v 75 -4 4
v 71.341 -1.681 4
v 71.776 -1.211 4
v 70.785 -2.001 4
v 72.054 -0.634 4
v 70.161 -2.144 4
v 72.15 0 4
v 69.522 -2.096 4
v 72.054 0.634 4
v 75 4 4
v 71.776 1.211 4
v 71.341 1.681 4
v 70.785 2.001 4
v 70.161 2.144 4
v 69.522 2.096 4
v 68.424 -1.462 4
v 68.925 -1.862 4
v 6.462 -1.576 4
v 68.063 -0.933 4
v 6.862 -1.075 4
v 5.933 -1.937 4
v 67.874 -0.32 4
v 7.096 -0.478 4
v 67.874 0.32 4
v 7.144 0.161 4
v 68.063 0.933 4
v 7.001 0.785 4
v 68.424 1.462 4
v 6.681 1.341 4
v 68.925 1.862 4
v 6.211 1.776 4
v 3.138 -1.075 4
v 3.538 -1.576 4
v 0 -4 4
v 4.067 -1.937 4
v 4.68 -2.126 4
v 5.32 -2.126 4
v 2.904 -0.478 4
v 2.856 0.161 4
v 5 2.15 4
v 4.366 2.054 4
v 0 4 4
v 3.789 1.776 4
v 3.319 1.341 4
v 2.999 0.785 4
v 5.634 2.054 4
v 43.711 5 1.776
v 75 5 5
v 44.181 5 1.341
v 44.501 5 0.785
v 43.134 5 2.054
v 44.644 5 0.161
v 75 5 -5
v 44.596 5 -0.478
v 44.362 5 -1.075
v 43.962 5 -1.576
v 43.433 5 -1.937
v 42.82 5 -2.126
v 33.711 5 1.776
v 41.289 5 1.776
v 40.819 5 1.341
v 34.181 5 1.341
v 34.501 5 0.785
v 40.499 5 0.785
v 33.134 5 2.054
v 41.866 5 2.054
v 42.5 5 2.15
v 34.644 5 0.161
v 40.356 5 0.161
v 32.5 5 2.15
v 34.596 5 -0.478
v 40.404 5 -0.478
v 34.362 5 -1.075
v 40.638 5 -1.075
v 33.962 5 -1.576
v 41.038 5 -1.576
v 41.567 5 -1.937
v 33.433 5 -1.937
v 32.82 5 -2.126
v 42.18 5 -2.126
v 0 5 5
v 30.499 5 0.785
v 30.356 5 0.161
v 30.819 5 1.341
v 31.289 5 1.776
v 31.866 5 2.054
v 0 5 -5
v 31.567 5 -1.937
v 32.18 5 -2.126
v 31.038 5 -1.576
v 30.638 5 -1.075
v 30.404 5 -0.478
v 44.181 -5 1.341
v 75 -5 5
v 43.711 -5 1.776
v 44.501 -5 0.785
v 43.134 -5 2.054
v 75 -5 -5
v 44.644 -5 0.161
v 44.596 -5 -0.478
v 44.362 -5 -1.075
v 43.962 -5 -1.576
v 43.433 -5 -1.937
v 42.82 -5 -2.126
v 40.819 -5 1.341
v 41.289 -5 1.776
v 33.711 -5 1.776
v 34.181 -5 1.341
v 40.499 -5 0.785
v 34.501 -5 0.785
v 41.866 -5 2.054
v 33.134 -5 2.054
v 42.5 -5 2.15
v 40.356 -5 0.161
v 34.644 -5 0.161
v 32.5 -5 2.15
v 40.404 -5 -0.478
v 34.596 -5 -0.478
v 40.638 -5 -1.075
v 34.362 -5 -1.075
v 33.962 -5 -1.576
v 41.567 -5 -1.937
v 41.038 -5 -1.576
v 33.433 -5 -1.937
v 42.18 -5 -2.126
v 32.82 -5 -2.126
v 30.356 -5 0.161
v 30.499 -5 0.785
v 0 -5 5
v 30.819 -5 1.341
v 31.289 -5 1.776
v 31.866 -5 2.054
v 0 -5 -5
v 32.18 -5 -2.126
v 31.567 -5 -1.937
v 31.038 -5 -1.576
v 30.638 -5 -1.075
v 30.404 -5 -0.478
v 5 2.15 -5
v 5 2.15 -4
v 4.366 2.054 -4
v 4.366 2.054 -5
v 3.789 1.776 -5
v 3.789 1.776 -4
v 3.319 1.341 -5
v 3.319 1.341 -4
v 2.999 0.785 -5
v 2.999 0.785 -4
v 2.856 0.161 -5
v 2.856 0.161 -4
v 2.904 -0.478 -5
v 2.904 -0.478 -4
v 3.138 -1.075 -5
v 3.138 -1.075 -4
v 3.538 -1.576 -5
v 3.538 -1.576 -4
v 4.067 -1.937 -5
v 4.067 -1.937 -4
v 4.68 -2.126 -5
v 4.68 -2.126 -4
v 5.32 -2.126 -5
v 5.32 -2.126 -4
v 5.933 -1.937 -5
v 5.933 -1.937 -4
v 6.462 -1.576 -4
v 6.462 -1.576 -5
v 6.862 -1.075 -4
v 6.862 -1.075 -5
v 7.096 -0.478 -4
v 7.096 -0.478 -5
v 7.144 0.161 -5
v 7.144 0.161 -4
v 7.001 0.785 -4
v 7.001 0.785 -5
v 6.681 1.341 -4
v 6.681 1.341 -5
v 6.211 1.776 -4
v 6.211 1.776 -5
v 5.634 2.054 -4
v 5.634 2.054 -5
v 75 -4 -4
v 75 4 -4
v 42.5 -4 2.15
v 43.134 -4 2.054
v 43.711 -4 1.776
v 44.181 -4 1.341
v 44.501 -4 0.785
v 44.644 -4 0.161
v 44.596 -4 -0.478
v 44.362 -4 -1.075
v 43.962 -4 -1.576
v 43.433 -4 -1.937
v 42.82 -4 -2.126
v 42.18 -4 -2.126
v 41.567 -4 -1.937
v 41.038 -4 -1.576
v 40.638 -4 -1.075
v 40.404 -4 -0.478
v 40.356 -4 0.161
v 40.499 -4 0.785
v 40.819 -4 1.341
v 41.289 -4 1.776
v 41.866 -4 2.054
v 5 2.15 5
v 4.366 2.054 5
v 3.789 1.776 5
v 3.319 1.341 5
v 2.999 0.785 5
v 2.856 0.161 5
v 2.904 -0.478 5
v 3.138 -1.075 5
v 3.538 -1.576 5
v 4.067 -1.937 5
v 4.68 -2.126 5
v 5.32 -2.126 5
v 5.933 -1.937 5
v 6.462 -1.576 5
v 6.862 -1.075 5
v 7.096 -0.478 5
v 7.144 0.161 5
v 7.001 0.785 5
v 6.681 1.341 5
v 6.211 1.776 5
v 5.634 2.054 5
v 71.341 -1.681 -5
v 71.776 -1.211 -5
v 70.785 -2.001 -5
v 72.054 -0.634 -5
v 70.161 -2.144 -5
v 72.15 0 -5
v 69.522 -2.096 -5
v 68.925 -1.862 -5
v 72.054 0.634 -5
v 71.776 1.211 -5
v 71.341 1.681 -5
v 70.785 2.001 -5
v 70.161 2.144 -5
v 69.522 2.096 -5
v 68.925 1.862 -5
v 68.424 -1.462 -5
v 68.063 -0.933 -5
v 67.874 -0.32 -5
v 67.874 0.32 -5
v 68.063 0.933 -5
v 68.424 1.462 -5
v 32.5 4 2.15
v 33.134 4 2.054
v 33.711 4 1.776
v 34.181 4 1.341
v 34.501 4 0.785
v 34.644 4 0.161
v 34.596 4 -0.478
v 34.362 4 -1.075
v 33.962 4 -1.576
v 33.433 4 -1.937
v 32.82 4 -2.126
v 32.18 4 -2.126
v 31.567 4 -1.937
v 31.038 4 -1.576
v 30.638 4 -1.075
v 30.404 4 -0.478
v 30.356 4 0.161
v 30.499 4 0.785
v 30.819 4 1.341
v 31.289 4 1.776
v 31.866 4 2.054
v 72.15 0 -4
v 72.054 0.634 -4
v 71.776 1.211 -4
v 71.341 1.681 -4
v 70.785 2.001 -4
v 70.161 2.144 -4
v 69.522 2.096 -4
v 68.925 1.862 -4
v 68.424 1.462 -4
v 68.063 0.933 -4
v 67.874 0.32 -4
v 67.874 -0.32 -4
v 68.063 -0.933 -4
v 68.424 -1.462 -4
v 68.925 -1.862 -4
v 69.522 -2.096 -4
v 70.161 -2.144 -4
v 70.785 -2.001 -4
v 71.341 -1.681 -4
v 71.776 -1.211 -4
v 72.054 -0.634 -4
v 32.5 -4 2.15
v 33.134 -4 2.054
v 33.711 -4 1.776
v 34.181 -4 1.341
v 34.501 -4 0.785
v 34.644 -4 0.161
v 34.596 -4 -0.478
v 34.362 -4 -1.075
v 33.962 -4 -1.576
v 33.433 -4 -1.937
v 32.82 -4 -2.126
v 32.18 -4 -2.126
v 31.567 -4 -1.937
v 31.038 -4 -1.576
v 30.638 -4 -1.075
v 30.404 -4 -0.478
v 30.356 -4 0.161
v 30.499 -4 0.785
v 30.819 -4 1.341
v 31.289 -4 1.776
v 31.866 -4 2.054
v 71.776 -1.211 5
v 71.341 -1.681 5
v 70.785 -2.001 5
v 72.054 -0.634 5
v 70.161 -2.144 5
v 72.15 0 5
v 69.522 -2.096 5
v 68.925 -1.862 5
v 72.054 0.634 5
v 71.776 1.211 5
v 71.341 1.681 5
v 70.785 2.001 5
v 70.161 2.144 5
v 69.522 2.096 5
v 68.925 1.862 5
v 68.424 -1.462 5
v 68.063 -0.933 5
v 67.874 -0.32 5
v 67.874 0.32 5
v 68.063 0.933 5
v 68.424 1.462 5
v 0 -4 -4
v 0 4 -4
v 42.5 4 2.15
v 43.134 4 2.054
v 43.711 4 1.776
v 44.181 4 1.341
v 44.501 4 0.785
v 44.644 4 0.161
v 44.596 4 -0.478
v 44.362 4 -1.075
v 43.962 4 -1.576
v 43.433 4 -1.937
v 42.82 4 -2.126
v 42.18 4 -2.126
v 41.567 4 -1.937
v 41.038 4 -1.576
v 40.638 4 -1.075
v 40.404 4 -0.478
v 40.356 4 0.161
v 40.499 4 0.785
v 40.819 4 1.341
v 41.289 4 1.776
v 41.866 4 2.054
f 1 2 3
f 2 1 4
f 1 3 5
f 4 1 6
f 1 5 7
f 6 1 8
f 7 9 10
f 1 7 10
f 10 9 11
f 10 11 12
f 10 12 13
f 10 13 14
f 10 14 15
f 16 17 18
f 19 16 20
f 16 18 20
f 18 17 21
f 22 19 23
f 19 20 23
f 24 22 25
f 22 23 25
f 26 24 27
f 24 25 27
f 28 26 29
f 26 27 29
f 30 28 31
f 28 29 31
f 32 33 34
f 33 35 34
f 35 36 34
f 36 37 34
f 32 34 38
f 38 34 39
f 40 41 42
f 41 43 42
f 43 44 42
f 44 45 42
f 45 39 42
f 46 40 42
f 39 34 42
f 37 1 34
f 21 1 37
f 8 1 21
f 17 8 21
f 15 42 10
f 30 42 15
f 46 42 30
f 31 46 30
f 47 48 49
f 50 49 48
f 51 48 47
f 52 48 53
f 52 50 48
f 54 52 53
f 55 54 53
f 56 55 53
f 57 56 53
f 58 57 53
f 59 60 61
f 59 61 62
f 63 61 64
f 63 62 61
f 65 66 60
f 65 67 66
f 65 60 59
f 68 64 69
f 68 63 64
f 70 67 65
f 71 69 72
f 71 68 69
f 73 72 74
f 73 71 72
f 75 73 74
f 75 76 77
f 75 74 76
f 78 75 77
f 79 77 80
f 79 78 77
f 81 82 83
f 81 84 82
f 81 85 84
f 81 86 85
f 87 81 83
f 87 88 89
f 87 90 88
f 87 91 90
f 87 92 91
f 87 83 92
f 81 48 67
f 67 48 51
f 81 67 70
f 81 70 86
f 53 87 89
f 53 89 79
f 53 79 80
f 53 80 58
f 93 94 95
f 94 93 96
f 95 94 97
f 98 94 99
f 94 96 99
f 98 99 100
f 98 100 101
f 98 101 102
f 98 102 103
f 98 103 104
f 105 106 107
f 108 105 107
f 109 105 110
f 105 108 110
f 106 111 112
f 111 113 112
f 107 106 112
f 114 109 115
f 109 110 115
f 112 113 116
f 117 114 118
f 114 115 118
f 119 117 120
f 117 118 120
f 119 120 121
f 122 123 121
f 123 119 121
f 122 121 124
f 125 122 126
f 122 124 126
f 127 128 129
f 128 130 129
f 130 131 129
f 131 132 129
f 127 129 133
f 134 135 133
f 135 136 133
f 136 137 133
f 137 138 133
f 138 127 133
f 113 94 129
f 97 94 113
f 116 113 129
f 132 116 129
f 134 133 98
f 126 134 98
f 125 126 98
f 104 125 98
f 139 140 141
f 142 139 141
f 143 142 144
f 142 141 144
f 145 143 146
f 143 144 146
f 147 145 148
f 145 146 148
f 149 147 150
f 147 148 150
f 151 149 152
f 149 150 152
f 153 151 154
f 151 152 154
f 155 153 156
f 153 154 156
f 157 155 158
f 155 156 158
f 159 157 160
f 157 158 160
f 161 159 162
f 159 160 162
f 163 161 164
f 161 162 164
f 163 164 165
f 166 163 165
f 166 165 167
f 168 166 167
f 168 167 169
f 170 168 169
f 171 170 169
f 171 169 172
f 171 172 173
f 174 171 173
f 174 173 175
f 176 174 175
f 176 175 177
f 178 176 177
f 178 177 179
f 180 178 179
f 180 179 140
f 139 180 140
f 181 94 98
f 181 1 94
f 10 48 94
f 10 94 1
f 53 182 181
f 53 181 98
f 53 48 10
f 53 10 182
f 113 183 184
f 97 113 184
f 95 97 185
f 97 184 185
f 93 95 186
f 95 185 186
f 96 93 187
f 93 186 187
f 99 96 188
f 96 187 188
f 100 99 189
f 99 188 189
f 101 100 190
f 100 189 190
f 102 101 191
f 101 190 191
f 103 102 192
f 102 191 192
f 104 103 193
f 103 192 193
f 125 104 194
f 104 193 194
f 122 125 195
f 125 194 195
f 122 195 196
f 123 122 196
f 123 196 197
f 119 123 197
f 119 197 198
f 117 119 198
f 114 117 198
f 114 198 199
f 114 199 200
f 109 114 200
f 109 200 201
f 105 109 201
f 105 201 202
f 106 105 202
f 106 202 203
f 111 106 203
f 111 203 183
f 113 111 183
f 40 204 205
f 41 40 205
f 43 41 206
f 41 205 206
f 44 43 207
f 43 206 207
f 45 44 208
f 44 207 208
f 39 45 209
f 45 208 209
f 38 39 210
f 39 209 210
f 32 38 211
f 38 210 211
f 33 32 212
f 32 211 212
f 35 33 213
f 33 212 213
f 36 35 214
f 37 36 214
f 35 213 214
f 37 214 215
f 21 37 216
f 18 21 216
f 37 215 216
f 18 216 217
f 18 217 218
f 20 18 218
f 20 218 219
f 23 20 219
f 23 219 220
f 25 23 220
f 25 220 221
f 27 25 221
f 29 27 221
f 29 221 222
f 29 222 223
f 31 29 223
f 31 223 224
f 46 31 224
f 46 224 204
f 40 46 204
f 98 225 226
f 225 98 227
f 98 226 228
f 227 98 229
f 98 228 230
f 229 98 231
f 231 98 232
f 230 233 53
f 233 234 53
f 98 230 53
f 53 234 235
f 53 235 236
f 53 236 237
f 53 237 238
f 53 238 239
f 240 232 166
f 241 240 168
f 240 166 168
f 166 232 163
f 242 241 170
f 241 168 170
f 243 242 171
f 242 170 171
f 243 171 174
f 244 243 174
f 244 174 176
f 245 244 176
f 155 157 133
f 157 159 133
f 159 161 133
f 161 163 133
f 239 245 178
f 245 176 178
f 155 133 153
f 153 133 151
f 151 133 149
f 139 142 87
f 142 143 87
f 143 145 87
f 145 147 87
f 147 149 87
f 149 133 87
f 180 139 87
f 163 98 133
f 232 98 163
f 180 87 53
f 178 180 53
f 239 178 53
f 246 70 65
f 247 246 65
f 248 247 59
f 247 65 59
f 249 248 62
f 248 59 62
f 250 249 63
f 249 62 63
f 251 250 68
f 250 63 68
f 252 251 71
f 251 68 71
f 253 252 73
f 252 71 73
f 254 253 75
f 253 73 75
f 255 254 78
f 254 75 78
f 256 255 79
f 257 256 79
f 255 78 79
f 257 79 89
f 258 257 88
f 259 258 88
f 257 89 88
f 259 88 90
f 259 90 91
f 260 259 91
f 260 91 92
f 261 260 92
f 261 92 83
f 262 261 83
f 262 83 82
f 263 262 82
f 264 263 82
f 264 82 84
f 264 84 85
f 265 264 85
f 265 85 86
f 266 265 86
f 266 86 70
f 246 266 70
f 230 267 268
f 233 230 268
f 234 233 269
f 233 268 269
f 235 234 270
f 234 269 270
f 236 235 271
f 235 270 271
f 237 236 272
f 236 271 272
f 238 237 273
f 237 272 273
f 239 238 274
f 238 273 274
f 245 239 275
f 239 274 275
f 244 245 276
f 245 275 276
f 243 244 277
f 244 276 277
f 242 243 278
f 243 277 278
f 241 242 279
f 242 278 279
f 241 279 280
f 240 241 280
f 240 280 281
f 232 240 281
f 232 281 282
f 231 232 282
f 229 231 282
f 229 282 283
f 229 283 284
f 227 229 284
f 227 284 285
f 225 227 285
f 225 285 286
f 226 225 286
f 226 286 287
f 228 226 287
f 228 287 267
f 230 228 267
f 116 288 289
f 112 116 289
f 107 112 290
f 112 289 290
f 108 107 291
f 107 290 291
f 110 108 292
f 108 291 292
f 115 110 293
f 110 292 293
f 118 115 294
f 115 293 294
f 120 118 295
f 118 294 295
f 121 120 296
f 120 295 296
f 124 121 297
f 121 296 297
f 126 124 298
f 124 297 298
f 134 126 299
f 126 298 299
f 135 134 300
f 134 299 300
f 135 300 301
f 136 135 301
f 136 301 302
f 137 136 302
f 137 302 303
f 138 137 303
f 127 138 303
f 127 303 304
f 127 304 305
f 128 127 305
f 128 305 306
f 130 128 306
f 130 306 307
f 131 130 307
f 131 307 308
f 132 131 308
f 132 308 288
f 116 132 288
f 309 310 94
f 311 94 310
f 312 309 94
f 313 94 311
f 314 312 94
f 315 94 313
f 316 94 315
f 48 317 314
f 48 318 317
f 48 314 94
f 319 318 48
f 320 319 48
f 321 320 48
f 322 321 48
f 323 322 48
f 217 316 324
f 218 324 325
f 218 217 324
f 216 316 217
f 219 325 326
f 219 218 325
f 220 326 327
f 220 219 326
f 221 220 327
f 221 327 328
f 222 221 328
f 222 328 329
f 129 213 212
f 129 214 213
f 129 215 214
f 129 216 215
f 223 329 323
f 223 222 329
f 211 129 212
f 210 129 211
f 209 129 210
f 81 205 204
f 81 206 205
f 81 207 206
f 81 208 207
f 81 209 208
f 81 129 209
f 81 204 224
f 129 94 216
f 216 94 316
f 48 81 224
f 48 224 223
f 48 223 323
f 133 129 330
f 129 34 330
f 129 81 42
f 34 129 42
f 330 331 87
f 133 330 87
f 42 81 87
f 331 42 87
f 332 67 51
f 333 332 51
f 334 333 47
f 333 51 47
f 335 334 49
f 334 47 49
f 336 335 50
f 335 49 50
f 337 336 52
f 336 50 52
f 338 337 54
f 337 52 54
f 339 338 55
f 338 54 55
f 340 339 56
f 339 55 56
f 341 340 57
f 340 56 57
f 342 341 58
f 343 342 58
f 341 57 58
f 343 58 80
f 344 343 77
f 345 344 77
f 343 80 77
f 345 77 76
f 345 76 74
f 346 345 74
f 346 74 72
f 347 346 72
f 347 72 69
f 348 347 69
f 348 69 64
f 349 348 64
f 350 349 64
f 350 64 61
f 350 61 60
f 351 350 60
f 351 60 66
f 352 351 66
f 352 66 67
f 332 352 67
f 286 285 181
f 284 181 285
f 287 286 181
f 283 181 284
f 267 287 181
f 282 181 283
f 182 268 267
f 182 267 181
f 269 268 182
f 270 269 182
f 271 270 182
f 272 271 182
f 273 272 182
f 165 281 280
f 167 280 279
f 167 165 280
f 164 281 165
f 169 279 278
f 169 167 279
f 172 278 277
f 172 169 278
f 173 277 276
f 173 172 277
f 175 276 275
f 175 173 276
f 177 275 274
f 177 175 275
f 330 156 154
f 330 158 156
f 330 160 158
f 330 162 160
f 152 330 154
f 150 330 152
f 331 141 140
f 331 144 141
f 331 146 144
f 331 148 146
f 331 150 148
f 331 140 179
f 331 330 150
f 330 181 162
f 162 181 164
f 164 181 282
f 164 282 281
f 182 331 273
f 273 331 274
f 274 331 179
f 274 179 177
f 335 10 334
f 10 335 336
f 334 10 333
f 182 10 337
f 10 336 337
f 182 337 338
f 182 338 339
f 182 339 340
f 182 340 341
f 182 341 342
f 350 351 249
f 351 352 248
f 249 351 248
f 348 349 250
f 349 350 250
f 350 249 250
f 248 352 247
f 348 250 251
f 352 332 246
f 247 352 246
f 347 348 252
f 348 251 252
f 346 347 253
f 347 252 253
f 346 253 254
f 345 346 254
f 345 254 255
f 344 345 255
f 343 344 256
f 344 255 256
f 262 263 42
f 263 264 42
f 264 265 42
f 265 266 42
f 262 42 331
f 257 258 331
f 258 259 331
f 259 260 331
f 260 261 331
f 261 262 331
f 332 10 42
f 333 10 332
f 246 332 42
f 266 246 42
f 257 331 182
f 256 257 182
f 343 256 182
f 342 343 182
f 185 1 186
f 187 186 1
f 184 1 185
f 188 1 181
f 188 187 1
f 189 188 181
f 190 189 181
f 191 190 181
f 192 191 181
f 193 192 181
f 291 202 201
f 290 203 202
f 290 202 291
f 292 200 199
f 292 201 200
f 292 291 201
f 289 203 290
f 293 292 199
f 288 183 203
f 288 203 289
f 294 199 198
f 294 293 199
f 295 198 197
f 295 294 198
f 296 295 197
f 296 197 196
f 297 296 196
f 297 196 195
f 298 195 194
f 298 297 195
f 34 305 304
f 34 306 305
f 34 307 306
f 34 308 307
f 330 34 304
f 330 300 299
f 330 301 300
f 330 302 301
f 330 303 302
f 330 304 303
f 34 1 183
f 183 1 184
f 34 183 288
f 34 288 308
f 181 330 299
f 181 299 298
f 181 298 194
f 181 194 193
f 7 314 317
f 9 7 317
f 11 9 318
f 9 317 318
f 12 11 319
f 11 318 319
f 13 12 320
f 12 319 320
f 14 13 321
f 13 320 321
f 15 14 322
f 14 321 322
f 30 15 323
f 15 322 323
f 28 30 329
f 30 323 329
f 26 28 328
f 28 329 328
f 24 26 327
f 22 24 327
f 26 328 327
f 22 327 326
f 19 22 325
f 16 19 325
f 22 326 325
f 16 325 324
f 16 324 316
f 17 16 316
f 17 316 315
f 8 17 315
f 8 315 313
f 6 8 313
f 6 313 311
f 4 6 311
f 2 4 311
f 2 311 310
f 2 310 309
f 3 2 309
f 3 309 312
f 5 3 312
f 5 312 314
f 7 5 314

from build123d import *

# Parameters (mm, degrees)
SKETCH_1_W          = 10
SKETCH_1_H          = 10
SKETCH_1_W_2        = 8
SKETCH_1_H_2        = 8
EXTRUDE_1_DEPTH     = 75
SKETCH_2_R          = 2.15
CUT_EXTRUDE_1_DEPTH = 76.828754441
SKETCH_3_R          = 2.15
CUT_EXTRUDE_2_DEPTH = 76.828754441


with BuildPart() as part:
    # ｽｹｯﾁ1 → 押し出し-薄板1 (new body)
    with BuildSketch(Plane(origin=(0, 0, 0), x_dir=(0, 0, -1), z_dir=(1, 0, 0))):
        Rectangle(SKETCH_1_W, SKETCH_1_H)
        Rectangle(SKETCH_1_W_2, SKETCH_1_H_2, mode=Mode.SUBTRACT)
    extrude(amount=EXTRUDE_1_DEPTH)

    # ｽｹｯﾁ2 → ｶｯﾄ - 押し出し1 (cut, through all)
    with BuildSketch(Plane.XY.offset(5)):
        with Locations((70, 0)):
            Circle(SKETCH_2_R)
        with Locations(Location((5, 0, 0), (0, 0, 90))):
            Circle(SKETCH_2_R)
    extrude(amount=-CUT_EXTRUDE_1_DEPTH, mode=Mode.SUBTRACT)

    # ｽｹｯﾁ3 → ｶｯﾄ - 押し出し2 (cut, through all)
    with BuildSketch(Plane(origin=(0, 5, 0), x_dir=(1, 0, 0), z_dir=(0, 1, 0))):
        with Locations(Location((42.5, 0, 0), (0, 0, 270))):
            Circle(SKETCH_3_R)
        with Locations(Location((32.5, 0, 0), (0, 0, 270))):
            Circle(SKETCH_3_R)
    extrude(amount=-CUT_EXTRUDE_2_DEPTH, mode=Mode.SUBTRACT)


solid = part.part
